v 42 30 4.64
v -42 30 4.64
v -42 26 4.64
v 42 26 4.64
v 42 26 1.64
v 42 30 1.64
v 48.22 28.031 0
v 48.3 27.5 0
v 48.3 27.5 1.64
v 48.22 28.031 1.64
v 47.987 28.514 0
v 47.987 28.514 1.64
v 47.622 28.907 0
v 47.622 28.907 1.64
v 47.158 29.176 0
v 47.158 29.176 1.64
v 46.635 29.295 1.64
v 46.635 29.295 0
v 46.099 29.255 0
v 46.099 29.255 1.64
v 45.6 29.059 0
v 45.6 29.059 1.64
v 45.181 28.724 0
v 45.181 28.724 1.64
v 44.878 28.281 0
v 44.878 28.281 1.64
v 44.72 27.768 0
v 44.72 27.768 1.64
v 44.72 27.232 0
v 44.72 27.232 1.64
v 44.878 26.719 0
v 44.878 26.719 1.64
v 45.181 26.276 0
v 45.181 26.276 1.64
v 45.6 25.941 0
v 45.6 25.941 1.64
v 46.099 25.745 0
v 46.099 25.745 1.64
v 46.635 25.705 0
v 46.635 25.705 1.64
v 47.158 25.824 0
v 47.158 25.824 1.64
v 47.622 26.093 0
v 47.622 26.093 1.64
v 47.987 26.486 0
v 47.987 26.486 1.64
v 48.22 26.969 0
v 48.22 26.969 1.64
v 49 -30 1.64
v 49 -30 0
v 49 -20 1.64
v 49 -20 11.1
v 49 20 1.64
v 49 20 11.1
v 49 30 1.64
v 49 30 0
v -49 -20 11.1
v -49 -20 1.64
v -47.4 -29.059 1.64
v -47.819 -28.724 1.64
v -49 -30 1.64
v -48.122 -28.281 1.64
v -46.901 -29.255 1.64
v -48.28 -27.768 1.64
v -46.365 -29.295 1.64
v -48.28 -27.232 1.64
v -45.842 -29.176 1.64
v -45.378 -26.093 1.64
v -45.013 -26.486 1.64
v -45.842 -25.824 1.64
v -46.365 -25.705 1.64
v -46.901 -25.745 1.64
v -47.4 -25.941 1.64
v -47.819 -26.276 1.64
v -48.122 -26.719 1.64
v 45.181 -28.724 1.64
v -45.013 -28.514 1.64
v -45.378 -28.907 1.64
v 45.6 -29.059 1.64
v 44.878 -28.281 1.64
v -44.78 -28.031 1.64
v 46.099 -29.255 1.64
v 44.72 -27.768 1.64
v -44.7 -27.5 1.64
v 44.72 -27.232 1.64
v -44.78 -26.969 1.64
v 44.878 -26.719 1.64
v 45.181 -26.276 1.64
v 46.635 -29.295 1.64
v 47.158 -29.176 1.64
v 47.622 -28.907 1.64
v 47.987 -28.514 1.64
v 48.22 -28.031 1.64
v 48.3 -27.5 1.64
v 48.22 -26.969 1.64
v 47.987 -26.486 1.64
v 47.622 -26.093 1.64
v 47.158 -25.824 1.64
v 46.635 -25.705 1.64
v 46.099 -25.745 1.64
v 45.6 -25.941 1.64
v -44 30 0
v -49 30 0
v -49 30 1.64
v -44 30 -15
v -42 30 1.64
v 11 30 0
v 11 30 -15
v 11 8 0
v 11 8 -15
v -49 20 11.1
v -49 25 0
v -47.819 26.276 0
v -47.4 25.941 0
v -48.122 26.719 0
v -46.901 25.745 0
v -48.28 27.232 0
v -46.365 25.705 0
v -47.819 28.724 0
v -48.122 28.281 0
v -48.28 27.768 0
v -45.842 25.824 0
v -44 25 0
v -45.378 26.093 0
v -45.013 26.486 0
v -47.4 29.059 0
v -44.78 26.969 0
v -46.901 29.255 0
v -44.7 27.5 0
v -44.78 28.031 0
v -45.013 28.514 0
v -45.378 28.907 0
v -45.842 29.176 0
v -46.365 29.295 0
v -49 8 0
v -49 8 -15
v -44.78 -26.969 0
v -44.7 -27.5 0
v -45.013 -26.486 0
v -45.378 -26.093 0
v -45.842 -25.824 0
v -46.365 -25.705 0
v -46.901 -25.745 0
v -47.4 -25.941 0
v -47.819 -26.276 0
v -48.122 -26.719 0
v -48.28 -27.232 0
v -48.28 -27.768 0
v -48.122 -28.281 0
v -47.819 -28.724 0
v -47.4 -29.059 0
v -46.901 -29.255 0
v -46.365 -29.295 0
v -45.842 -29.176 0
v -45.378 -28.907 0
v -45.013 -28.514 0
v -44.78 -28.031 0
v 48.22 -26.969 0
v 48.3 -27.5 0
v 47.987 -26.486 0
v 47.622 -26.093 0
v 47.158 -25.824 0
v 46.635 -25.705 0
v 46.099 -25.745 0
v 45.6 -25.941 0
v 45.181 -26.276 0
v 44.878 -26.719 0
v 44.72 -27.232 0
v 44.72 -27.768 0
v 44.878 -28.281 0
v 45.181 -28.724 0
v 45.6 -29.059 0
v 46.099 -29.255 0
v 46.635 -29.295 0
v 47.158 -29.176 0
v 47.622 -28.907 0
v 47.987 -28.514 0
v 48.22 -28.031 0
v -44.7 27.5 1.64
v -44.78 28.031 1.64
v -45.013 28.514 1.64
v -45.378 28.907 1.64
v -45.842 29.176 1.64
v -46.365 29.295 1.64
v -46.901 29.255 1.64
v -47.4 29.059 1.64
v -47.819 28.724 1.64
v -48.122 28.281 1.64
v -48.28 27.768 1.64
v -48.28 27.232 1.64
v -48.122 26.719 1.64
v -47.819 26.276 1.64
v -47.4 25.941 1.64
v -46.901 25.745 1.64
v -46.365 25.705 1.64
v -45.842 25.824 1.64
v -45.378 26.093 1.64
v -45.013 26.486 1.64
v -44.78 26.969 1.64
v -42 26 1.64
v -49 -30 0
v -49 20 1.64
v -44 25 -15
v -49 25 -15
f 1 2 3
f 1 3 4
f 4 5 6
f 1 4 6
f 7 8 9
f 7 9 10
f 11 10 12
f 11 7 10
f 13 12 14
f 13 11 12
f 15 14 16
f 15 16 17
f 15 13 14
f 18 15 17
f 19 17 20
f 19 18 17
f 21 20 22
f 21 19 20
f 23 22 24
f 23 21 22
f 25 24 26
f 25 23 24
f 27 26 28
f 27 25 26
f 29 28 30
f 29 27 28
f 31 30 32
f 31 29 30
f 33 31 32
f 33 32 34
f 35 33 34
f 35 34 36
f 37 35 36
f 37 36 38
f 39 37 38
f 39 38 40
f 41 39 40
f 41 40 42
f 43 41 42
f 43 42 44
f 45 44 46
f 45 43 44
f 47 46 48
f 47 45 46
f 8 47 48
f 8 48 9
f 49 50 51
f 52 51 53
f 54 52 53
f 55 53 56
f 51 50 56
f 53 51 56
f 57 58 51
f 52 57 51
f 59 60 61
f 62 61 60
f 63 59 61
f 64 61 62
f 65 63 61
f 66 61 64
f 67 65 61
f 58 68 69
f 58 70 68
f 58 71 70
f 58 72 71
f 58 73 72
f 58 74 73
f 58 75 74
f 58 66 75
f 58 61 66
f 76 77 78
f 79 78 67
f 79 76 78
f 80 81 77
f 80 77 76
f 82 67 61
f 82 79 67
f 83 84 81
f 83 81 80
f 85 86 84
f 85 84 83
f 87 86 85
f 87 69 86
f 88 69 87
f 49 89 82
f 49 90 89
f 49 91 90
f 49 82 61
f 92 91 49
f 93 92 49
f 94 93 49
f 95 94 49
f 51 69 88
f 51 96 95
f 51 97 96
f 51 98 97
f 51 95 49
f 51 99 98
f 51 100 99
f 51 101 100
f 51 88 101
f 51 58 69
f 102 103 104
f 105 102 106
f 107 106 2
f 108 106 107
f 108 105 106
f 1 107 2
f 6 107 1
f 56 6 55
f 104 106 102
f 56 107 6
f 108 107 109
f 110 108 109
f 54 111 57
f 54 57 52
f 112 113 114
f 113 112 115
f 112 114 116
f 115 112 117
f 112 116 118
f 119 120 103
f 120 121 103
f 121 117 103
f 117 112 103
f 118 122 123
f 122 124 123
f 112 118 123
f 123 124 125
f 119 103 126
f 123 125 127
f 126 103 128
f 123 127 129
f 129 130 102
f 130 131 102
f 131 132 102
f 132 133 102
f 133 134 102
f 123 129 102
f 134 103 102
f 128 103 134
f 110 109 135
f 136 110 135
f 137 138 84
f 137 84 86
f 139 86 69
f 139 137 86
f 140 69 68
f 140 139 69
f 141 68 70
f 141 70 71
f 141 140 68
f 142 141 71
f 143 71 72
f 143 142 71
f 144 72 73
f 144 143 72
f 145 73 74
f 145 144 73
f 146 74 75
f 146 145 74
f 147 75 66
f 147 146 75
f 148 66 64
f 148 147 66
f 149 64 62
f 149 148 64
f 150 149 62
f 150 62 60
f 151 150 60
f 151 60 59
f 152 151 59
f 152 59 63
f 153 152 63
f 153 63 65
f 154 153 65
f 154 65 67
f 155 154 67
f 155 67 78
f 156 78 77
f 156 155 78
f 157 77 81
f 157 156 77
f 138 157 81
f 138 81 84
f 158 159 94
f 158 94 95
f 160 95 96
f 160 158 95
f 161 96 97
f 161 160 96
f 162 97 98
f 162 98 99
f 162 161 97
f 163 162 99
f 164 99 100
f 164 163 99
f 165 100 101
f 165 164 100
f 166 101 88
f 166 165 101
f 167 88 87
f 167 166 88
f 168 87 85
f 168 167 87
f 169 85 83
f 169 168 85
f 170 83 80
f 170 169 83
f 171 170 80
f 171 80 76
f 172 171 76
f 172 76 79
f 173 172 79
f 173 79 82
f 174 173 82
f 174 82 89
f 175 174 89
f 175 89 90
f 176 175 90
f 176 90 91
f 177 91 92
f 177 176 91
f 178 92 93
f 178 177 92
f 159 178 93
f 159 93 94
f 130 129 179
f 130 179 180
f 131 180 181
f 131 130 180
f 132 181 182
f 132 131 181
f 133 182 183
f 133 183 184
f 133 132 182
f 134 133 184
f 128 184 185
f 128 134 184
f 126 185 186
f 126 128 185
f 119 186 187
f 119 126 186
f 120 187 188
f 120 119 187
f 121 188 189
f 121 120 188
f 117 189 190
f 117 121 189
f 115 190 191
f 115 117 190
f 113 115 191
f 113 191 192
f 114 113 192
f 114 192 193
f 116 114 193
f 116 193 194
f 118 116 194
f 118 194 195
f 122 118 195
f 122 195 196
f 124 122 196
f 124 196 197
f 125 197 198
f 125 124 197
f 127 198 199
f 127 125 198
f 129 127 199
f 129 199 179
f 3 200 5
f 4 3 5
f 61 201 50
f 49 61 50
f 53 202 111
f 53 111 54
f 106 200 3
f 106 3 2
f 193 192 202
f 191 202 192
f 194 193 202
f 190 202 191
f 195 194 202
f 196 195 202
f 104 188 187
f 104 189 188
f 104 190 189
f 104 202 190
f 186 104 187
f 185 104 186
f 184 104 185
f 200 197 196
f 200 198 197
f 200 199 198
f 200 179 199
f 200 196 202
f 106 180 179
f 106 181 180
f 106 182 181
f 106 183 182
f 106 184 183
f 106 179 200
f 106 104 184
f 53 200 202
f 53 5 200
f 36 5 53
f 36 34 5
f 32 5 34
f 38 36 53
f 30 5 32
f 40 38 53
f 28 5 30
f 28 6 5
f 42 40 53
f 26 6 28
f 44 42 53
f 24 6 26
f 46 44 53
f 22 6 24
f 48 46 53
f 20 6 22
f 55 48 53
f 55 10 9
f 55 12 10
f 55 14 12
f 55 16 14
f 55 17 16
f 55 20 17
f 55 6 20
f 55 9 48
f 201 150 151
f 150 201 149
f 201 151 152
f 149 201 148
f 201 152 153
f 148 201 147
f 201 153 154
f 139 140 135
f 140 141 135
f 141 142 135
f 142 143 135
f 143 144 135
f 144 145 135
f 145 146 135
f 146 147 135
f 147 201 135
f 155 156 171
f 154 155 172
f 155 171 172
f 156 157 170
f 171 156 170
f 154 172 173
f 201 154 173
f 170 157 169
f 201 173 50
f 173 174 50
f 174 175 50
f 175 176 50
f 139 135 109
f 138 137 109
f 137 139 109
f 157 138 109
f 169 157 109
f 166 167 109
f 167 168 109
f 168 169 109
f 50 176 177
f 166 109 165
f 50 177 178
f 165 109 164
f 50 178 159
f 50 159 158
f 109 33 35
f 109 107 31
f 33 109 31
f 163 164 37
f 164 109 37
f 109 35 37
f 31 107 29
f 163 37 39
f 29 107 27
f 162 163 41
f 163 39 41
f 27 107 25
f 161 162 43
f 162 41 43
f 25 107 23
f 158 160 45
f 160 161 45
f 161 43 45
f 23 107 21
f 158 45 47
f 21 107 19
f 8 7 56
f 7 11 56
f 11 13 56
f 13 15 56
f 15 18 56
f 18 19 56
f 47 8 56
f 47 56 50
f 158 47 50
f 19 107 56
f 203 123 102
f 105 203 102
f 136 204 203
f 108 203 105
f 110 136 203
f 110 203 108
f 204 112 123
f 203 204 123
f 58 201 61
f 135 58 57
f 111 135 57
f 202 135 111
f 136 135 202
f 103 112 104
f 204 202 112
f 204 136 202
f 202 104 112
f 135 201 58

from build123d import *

# Parameters (mm, degrees)
F0_W     = 98
F0_H     = 60
F0_R     = 1.8
F1_DEPTH = 1.64
F2_W     = 98
F2_H     = 40
F3_DEPTH = 9.46
F4_W     = 84
F4_H     = 4
F5_DEPTH = 3
F7_DEPTH = 15


with BuildPart() as f1:
    # F0 (on Top) → F1 (new body)
    with BuildSketch(Plane.XY):
        Rectangle(F0_W, F0_H)
        with Locations((-46.5, -27.5)):
            Circle(F0_R, mode=Mode.SUBTRACT)
        with Locations((46.5, -27.5)):
            Circle(F0_R, mode=Mode.SUBTRACT)
        with Locations((-46.5, 27.5)):
            Circle(F0_R, mode=Mode.SUBTRACT)
        with Locations((46.5, 27.5)):
            Circle(F0_R, mode=Mode.SUBTRACT)
    extrude(amount=F1_DEPTH)

    # F2 (on face) → F3 (join)
    with BuildSketch(Plane.XY.offset(1.64)):
        Rectangle(F2_W, F2_H)
    extrude(amount=F3_DEPTH)

    # F4 (on face) → F5 (join)
    with BuildSketch(Plane.XY.offset(1.64)):
        with Locations((0, 28)):
            Rectangle(F4_W, F4_H)
    extrude(amount=F5_DEPTH)

    # F6 (on face) → F7 (join)
    with BuildSketch(Plane(origin=(0, 0, 0), x_dir=(1, 0, 0), z_dir=(0, 0, -1))):
        Polygon((11, -8), (-49, -8), (-49, -25), (-44, -25), (-44, -30), (11, -30), align=None)
    extrude(amount=F7_DEPTH)


solid = f1.part
